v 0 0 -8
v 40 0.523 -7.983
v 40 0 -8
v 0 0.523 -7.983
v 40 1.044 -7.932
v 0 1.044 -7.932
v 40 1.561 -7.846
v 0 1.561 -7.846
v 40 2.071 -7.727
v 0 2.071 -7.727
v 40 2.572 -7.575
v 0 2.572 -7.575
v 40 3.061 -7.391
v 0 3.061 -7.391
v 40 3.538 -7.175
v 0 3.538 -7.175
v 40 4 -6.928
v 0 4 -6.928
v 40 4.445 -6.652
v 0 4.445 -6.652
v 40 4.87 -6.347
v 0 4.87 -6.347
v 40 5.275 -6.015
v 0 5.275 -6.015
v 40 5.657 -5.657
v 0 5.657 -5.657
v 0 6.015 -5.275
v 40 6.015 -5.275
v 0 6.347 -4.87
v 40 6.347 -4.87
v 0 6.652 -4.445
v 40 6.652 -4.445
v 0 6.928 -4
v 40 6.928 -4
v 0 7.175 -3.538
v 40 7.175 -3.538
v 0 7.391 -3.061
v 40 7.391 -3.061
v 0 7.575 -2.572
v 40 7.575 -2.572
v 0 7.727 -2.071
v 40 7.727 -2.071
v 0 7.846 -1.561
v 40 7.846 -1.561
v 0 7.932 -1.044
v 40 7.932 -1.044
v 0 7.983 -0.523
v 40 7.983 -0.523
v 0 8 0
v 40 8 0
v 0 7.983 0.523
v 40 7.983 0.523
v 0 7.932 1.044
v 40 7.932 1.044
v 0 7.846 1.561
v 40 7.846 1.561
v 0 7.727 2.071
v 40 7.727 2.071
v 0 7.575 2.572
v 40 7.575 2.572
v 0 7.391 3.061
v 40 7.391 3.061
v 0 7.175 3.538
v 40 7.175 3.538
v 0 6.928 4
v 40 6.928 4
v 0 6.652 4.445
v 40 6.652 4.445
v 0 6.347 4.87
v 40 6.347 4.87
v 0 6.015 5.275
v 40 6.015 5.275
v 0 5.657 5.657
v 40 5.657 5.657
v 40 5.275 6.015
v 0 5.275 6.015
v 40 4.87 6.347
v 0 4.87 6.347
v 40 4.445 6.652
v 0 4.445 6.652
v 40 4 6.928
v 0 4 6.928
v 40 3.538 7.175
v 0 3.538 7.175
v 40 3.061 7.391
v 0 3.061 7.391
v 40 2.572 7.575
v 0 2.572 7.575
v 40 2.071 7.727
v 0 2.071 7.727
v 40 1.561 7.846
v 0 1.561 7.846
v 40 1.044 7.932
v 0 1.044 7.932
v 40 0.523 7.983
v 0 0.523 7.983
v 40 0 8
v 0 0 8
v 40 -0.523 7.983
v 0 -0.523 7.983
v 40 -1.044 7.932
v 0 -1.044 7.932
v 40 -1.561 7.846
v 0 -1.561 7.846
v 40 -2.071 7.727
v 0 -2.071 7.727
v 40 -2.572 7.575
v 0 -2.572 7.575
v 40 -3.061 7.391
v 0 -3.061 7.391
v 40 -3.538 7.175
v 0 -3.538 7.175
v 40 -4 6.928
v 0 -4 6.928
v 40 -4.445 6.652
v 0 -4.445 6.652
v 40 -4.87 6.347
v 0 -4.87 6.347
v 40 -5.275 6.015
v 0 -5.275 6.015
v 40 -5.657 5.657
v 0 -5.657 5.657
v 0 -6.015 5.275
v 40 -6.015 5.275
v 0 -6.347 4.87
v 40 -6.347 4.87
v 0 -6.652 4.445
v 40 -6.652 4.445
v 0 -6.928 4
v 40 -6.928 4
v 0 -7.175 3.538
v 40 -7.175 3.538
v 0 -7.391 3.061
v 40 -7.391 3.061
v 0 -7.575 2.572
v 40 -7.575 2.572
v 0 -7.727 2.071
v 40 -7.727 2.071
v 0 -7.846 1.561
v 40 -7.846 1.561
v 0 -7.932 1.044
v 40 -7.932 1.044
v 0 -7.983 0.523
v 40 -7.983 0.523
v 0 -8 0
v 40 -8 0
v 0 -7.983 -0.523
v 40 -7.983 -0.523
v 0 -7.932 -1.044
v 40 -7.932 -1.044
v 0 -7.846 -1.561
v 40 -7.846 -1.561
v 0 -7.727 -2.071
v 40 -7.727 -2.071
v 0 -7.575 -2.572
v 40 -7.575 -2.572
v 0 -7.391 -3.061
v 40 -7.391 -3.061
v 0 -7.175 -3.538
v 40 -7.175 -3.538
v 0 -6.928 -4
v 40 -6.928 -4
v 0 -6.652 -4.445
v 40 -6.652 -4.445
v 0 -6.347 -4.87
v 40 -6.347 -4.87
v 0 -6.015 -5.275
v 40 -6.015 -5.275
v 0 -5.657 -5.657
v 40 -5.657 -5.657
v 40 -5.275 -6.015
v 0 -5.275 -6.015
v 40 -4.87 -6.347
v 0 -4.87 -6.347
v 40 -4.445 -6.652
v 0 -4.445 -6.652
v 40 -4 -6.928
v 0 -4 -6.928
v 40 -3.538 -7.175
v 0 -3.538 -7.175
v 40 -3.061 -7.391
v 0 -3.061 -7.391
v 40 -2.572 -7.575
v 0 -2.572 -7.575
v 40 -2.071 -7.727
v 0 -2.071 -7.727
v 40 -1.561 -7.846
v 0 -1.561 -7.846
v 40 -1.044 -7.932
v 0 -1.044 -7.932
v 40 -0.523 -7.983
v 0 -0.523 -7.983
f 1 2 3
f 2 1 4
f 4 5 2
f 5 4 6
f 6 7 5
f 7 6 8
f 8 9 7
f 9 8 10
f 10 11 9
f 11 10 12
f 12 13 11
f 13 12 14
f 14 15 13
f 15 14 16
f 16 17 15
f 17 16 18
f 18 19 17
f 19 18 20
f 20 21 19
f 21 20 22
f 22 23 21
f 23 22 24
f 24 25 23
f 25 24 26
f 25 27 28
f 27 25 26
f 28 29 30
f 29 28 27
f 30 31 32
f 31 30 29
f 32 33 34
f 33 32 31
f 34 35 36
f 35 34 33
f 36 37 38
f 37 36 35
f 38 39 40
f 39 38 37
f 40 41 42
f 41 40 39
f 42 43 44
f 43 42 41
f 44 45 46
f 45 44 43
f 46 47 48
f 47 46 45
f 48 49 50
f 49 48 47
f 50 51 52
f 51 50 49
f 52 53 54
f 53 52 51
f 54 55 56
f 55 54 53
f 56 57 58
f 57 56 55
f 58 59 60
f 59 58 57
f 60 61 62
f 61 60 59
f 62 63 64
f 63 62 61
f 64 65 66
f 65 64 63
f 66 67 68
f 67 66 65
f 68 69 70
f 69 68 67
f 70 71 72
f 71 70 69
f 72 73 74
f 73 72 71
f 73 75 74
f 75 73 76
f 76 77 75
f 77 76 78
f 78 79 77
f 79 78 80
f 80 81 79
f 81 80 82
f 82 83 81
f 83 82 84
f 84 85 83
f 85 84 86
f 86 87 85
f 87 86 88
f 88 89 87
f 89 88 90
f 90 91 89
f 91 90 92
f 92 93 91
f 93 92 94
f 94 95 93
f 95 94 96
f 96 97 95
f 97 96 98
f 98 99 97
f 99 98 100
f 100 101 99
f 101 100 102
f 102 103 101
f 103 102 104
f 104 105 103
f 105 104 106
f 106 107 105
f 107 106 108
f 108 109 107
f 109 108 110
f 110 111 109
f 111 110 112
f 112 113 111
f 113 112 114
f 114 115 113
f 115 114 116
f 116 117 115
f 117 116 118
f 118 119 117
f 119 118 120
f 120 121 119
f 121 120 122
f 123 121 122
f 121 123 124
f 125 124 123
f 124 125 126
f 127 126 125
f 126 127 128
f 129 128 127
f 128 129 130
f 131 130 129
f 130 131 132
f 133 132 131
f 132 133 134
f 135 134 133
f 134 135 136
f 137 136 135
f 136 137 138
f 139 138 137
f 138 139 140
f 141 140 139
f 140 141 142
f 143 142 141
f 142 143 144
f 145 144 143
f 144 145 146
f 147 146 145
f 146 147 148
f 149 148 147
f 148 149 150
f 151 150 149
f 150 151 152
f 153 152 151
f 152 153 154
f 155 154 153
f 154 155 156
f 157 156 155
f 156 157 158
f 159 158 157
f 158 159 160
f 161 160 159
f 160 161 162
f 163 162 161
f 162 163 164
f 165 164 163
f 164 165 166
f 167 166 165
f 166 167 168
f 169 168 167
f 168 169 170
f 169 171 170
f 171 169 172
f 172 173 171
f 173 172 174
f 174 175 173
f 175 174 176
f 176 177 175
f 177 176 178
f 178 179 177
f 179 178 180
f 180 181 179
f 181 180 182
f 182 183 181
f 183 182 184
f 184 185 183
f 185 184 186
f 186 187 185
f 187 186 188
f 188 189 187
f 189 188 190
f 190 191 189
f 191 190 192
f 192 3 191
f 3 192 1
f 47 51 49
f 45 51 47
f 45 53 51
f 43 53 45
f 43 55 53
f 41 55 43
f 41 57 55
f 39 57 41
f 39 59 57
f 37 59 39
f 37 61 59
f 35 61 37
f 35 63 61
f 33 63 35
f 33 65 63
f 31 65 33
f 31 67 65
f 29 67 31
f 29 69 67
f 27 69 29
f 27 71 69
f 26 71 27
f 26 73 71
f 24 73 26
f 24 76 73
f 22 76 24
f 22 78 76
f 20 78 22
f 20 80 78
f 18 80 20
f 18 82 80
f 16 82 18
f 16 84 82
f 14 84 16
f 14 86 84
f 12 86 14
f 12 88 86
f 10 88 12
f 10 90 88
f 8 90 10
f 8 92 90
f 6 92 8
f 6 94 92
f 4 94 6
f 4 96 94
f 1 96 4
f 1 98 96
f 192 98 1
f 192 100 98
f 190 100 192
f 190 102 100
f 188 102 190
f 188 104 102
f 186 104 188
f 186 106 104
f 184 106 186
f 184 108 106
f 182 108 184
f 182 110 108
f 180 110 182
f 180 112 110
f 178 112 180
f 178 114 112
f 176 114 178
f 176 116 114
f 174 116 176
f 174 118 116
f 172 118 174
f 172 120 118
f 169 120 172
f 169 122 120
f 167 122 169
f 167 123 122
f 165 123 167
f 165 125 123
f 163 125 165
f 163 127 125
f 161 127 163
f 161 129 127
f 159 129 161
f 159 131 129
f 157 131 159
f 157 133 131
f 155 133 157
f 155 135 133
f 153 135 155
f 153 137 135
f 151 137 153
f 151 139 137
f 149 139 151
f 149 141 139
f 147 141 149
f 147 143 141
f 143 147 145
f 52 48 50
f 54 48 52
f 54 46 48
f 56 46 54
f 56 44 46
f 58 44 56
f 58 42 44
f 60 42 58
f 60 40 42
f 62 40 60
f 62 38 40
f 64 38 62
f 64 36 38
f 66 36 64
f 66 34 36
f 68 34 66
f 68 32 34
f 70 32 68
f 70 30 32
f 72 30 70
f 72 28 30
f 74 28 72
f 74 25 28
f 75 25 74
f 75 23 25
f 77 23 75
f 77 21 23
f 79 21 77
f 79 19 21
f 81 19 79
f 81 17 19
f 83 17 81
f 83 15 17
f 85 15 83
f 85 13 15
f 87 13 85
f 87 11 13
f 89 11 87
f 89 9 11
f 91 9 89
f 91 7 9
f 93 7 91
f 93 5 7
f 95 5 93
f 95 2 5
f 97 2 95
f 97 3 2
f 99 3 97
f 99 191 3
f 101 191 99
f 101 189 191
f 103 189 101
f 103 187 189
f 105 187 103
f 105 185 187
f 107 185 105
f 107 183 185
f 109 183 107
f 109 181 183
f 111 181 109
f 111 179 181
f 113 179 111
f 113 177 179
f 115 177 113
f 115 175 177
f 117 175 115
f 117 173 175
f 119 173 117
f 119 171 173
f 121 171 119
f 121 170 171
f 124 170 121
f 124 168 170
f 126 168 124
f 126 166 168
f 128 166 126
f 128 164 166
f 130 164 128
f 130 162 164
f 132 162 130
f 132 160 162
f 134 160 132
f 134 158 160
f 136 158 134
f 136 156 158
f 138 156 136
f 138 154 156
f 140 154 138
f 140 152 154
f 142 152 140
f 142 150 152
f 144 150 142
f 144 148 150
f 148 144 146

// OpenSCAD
// Auto-generated from tests/data/feature_fixtures_manifest.json
// fixture: cylinder_x_axis
// fixture_type: cylinder
// description: Solid cylinder along x-axis to exercise non-z cylinder detection.
$fn = 96;

diameter = 16.000000;
height = 40.000000;

rotate([0, 90, 0]) cylinder(h=height, d=diameter, center=false);
